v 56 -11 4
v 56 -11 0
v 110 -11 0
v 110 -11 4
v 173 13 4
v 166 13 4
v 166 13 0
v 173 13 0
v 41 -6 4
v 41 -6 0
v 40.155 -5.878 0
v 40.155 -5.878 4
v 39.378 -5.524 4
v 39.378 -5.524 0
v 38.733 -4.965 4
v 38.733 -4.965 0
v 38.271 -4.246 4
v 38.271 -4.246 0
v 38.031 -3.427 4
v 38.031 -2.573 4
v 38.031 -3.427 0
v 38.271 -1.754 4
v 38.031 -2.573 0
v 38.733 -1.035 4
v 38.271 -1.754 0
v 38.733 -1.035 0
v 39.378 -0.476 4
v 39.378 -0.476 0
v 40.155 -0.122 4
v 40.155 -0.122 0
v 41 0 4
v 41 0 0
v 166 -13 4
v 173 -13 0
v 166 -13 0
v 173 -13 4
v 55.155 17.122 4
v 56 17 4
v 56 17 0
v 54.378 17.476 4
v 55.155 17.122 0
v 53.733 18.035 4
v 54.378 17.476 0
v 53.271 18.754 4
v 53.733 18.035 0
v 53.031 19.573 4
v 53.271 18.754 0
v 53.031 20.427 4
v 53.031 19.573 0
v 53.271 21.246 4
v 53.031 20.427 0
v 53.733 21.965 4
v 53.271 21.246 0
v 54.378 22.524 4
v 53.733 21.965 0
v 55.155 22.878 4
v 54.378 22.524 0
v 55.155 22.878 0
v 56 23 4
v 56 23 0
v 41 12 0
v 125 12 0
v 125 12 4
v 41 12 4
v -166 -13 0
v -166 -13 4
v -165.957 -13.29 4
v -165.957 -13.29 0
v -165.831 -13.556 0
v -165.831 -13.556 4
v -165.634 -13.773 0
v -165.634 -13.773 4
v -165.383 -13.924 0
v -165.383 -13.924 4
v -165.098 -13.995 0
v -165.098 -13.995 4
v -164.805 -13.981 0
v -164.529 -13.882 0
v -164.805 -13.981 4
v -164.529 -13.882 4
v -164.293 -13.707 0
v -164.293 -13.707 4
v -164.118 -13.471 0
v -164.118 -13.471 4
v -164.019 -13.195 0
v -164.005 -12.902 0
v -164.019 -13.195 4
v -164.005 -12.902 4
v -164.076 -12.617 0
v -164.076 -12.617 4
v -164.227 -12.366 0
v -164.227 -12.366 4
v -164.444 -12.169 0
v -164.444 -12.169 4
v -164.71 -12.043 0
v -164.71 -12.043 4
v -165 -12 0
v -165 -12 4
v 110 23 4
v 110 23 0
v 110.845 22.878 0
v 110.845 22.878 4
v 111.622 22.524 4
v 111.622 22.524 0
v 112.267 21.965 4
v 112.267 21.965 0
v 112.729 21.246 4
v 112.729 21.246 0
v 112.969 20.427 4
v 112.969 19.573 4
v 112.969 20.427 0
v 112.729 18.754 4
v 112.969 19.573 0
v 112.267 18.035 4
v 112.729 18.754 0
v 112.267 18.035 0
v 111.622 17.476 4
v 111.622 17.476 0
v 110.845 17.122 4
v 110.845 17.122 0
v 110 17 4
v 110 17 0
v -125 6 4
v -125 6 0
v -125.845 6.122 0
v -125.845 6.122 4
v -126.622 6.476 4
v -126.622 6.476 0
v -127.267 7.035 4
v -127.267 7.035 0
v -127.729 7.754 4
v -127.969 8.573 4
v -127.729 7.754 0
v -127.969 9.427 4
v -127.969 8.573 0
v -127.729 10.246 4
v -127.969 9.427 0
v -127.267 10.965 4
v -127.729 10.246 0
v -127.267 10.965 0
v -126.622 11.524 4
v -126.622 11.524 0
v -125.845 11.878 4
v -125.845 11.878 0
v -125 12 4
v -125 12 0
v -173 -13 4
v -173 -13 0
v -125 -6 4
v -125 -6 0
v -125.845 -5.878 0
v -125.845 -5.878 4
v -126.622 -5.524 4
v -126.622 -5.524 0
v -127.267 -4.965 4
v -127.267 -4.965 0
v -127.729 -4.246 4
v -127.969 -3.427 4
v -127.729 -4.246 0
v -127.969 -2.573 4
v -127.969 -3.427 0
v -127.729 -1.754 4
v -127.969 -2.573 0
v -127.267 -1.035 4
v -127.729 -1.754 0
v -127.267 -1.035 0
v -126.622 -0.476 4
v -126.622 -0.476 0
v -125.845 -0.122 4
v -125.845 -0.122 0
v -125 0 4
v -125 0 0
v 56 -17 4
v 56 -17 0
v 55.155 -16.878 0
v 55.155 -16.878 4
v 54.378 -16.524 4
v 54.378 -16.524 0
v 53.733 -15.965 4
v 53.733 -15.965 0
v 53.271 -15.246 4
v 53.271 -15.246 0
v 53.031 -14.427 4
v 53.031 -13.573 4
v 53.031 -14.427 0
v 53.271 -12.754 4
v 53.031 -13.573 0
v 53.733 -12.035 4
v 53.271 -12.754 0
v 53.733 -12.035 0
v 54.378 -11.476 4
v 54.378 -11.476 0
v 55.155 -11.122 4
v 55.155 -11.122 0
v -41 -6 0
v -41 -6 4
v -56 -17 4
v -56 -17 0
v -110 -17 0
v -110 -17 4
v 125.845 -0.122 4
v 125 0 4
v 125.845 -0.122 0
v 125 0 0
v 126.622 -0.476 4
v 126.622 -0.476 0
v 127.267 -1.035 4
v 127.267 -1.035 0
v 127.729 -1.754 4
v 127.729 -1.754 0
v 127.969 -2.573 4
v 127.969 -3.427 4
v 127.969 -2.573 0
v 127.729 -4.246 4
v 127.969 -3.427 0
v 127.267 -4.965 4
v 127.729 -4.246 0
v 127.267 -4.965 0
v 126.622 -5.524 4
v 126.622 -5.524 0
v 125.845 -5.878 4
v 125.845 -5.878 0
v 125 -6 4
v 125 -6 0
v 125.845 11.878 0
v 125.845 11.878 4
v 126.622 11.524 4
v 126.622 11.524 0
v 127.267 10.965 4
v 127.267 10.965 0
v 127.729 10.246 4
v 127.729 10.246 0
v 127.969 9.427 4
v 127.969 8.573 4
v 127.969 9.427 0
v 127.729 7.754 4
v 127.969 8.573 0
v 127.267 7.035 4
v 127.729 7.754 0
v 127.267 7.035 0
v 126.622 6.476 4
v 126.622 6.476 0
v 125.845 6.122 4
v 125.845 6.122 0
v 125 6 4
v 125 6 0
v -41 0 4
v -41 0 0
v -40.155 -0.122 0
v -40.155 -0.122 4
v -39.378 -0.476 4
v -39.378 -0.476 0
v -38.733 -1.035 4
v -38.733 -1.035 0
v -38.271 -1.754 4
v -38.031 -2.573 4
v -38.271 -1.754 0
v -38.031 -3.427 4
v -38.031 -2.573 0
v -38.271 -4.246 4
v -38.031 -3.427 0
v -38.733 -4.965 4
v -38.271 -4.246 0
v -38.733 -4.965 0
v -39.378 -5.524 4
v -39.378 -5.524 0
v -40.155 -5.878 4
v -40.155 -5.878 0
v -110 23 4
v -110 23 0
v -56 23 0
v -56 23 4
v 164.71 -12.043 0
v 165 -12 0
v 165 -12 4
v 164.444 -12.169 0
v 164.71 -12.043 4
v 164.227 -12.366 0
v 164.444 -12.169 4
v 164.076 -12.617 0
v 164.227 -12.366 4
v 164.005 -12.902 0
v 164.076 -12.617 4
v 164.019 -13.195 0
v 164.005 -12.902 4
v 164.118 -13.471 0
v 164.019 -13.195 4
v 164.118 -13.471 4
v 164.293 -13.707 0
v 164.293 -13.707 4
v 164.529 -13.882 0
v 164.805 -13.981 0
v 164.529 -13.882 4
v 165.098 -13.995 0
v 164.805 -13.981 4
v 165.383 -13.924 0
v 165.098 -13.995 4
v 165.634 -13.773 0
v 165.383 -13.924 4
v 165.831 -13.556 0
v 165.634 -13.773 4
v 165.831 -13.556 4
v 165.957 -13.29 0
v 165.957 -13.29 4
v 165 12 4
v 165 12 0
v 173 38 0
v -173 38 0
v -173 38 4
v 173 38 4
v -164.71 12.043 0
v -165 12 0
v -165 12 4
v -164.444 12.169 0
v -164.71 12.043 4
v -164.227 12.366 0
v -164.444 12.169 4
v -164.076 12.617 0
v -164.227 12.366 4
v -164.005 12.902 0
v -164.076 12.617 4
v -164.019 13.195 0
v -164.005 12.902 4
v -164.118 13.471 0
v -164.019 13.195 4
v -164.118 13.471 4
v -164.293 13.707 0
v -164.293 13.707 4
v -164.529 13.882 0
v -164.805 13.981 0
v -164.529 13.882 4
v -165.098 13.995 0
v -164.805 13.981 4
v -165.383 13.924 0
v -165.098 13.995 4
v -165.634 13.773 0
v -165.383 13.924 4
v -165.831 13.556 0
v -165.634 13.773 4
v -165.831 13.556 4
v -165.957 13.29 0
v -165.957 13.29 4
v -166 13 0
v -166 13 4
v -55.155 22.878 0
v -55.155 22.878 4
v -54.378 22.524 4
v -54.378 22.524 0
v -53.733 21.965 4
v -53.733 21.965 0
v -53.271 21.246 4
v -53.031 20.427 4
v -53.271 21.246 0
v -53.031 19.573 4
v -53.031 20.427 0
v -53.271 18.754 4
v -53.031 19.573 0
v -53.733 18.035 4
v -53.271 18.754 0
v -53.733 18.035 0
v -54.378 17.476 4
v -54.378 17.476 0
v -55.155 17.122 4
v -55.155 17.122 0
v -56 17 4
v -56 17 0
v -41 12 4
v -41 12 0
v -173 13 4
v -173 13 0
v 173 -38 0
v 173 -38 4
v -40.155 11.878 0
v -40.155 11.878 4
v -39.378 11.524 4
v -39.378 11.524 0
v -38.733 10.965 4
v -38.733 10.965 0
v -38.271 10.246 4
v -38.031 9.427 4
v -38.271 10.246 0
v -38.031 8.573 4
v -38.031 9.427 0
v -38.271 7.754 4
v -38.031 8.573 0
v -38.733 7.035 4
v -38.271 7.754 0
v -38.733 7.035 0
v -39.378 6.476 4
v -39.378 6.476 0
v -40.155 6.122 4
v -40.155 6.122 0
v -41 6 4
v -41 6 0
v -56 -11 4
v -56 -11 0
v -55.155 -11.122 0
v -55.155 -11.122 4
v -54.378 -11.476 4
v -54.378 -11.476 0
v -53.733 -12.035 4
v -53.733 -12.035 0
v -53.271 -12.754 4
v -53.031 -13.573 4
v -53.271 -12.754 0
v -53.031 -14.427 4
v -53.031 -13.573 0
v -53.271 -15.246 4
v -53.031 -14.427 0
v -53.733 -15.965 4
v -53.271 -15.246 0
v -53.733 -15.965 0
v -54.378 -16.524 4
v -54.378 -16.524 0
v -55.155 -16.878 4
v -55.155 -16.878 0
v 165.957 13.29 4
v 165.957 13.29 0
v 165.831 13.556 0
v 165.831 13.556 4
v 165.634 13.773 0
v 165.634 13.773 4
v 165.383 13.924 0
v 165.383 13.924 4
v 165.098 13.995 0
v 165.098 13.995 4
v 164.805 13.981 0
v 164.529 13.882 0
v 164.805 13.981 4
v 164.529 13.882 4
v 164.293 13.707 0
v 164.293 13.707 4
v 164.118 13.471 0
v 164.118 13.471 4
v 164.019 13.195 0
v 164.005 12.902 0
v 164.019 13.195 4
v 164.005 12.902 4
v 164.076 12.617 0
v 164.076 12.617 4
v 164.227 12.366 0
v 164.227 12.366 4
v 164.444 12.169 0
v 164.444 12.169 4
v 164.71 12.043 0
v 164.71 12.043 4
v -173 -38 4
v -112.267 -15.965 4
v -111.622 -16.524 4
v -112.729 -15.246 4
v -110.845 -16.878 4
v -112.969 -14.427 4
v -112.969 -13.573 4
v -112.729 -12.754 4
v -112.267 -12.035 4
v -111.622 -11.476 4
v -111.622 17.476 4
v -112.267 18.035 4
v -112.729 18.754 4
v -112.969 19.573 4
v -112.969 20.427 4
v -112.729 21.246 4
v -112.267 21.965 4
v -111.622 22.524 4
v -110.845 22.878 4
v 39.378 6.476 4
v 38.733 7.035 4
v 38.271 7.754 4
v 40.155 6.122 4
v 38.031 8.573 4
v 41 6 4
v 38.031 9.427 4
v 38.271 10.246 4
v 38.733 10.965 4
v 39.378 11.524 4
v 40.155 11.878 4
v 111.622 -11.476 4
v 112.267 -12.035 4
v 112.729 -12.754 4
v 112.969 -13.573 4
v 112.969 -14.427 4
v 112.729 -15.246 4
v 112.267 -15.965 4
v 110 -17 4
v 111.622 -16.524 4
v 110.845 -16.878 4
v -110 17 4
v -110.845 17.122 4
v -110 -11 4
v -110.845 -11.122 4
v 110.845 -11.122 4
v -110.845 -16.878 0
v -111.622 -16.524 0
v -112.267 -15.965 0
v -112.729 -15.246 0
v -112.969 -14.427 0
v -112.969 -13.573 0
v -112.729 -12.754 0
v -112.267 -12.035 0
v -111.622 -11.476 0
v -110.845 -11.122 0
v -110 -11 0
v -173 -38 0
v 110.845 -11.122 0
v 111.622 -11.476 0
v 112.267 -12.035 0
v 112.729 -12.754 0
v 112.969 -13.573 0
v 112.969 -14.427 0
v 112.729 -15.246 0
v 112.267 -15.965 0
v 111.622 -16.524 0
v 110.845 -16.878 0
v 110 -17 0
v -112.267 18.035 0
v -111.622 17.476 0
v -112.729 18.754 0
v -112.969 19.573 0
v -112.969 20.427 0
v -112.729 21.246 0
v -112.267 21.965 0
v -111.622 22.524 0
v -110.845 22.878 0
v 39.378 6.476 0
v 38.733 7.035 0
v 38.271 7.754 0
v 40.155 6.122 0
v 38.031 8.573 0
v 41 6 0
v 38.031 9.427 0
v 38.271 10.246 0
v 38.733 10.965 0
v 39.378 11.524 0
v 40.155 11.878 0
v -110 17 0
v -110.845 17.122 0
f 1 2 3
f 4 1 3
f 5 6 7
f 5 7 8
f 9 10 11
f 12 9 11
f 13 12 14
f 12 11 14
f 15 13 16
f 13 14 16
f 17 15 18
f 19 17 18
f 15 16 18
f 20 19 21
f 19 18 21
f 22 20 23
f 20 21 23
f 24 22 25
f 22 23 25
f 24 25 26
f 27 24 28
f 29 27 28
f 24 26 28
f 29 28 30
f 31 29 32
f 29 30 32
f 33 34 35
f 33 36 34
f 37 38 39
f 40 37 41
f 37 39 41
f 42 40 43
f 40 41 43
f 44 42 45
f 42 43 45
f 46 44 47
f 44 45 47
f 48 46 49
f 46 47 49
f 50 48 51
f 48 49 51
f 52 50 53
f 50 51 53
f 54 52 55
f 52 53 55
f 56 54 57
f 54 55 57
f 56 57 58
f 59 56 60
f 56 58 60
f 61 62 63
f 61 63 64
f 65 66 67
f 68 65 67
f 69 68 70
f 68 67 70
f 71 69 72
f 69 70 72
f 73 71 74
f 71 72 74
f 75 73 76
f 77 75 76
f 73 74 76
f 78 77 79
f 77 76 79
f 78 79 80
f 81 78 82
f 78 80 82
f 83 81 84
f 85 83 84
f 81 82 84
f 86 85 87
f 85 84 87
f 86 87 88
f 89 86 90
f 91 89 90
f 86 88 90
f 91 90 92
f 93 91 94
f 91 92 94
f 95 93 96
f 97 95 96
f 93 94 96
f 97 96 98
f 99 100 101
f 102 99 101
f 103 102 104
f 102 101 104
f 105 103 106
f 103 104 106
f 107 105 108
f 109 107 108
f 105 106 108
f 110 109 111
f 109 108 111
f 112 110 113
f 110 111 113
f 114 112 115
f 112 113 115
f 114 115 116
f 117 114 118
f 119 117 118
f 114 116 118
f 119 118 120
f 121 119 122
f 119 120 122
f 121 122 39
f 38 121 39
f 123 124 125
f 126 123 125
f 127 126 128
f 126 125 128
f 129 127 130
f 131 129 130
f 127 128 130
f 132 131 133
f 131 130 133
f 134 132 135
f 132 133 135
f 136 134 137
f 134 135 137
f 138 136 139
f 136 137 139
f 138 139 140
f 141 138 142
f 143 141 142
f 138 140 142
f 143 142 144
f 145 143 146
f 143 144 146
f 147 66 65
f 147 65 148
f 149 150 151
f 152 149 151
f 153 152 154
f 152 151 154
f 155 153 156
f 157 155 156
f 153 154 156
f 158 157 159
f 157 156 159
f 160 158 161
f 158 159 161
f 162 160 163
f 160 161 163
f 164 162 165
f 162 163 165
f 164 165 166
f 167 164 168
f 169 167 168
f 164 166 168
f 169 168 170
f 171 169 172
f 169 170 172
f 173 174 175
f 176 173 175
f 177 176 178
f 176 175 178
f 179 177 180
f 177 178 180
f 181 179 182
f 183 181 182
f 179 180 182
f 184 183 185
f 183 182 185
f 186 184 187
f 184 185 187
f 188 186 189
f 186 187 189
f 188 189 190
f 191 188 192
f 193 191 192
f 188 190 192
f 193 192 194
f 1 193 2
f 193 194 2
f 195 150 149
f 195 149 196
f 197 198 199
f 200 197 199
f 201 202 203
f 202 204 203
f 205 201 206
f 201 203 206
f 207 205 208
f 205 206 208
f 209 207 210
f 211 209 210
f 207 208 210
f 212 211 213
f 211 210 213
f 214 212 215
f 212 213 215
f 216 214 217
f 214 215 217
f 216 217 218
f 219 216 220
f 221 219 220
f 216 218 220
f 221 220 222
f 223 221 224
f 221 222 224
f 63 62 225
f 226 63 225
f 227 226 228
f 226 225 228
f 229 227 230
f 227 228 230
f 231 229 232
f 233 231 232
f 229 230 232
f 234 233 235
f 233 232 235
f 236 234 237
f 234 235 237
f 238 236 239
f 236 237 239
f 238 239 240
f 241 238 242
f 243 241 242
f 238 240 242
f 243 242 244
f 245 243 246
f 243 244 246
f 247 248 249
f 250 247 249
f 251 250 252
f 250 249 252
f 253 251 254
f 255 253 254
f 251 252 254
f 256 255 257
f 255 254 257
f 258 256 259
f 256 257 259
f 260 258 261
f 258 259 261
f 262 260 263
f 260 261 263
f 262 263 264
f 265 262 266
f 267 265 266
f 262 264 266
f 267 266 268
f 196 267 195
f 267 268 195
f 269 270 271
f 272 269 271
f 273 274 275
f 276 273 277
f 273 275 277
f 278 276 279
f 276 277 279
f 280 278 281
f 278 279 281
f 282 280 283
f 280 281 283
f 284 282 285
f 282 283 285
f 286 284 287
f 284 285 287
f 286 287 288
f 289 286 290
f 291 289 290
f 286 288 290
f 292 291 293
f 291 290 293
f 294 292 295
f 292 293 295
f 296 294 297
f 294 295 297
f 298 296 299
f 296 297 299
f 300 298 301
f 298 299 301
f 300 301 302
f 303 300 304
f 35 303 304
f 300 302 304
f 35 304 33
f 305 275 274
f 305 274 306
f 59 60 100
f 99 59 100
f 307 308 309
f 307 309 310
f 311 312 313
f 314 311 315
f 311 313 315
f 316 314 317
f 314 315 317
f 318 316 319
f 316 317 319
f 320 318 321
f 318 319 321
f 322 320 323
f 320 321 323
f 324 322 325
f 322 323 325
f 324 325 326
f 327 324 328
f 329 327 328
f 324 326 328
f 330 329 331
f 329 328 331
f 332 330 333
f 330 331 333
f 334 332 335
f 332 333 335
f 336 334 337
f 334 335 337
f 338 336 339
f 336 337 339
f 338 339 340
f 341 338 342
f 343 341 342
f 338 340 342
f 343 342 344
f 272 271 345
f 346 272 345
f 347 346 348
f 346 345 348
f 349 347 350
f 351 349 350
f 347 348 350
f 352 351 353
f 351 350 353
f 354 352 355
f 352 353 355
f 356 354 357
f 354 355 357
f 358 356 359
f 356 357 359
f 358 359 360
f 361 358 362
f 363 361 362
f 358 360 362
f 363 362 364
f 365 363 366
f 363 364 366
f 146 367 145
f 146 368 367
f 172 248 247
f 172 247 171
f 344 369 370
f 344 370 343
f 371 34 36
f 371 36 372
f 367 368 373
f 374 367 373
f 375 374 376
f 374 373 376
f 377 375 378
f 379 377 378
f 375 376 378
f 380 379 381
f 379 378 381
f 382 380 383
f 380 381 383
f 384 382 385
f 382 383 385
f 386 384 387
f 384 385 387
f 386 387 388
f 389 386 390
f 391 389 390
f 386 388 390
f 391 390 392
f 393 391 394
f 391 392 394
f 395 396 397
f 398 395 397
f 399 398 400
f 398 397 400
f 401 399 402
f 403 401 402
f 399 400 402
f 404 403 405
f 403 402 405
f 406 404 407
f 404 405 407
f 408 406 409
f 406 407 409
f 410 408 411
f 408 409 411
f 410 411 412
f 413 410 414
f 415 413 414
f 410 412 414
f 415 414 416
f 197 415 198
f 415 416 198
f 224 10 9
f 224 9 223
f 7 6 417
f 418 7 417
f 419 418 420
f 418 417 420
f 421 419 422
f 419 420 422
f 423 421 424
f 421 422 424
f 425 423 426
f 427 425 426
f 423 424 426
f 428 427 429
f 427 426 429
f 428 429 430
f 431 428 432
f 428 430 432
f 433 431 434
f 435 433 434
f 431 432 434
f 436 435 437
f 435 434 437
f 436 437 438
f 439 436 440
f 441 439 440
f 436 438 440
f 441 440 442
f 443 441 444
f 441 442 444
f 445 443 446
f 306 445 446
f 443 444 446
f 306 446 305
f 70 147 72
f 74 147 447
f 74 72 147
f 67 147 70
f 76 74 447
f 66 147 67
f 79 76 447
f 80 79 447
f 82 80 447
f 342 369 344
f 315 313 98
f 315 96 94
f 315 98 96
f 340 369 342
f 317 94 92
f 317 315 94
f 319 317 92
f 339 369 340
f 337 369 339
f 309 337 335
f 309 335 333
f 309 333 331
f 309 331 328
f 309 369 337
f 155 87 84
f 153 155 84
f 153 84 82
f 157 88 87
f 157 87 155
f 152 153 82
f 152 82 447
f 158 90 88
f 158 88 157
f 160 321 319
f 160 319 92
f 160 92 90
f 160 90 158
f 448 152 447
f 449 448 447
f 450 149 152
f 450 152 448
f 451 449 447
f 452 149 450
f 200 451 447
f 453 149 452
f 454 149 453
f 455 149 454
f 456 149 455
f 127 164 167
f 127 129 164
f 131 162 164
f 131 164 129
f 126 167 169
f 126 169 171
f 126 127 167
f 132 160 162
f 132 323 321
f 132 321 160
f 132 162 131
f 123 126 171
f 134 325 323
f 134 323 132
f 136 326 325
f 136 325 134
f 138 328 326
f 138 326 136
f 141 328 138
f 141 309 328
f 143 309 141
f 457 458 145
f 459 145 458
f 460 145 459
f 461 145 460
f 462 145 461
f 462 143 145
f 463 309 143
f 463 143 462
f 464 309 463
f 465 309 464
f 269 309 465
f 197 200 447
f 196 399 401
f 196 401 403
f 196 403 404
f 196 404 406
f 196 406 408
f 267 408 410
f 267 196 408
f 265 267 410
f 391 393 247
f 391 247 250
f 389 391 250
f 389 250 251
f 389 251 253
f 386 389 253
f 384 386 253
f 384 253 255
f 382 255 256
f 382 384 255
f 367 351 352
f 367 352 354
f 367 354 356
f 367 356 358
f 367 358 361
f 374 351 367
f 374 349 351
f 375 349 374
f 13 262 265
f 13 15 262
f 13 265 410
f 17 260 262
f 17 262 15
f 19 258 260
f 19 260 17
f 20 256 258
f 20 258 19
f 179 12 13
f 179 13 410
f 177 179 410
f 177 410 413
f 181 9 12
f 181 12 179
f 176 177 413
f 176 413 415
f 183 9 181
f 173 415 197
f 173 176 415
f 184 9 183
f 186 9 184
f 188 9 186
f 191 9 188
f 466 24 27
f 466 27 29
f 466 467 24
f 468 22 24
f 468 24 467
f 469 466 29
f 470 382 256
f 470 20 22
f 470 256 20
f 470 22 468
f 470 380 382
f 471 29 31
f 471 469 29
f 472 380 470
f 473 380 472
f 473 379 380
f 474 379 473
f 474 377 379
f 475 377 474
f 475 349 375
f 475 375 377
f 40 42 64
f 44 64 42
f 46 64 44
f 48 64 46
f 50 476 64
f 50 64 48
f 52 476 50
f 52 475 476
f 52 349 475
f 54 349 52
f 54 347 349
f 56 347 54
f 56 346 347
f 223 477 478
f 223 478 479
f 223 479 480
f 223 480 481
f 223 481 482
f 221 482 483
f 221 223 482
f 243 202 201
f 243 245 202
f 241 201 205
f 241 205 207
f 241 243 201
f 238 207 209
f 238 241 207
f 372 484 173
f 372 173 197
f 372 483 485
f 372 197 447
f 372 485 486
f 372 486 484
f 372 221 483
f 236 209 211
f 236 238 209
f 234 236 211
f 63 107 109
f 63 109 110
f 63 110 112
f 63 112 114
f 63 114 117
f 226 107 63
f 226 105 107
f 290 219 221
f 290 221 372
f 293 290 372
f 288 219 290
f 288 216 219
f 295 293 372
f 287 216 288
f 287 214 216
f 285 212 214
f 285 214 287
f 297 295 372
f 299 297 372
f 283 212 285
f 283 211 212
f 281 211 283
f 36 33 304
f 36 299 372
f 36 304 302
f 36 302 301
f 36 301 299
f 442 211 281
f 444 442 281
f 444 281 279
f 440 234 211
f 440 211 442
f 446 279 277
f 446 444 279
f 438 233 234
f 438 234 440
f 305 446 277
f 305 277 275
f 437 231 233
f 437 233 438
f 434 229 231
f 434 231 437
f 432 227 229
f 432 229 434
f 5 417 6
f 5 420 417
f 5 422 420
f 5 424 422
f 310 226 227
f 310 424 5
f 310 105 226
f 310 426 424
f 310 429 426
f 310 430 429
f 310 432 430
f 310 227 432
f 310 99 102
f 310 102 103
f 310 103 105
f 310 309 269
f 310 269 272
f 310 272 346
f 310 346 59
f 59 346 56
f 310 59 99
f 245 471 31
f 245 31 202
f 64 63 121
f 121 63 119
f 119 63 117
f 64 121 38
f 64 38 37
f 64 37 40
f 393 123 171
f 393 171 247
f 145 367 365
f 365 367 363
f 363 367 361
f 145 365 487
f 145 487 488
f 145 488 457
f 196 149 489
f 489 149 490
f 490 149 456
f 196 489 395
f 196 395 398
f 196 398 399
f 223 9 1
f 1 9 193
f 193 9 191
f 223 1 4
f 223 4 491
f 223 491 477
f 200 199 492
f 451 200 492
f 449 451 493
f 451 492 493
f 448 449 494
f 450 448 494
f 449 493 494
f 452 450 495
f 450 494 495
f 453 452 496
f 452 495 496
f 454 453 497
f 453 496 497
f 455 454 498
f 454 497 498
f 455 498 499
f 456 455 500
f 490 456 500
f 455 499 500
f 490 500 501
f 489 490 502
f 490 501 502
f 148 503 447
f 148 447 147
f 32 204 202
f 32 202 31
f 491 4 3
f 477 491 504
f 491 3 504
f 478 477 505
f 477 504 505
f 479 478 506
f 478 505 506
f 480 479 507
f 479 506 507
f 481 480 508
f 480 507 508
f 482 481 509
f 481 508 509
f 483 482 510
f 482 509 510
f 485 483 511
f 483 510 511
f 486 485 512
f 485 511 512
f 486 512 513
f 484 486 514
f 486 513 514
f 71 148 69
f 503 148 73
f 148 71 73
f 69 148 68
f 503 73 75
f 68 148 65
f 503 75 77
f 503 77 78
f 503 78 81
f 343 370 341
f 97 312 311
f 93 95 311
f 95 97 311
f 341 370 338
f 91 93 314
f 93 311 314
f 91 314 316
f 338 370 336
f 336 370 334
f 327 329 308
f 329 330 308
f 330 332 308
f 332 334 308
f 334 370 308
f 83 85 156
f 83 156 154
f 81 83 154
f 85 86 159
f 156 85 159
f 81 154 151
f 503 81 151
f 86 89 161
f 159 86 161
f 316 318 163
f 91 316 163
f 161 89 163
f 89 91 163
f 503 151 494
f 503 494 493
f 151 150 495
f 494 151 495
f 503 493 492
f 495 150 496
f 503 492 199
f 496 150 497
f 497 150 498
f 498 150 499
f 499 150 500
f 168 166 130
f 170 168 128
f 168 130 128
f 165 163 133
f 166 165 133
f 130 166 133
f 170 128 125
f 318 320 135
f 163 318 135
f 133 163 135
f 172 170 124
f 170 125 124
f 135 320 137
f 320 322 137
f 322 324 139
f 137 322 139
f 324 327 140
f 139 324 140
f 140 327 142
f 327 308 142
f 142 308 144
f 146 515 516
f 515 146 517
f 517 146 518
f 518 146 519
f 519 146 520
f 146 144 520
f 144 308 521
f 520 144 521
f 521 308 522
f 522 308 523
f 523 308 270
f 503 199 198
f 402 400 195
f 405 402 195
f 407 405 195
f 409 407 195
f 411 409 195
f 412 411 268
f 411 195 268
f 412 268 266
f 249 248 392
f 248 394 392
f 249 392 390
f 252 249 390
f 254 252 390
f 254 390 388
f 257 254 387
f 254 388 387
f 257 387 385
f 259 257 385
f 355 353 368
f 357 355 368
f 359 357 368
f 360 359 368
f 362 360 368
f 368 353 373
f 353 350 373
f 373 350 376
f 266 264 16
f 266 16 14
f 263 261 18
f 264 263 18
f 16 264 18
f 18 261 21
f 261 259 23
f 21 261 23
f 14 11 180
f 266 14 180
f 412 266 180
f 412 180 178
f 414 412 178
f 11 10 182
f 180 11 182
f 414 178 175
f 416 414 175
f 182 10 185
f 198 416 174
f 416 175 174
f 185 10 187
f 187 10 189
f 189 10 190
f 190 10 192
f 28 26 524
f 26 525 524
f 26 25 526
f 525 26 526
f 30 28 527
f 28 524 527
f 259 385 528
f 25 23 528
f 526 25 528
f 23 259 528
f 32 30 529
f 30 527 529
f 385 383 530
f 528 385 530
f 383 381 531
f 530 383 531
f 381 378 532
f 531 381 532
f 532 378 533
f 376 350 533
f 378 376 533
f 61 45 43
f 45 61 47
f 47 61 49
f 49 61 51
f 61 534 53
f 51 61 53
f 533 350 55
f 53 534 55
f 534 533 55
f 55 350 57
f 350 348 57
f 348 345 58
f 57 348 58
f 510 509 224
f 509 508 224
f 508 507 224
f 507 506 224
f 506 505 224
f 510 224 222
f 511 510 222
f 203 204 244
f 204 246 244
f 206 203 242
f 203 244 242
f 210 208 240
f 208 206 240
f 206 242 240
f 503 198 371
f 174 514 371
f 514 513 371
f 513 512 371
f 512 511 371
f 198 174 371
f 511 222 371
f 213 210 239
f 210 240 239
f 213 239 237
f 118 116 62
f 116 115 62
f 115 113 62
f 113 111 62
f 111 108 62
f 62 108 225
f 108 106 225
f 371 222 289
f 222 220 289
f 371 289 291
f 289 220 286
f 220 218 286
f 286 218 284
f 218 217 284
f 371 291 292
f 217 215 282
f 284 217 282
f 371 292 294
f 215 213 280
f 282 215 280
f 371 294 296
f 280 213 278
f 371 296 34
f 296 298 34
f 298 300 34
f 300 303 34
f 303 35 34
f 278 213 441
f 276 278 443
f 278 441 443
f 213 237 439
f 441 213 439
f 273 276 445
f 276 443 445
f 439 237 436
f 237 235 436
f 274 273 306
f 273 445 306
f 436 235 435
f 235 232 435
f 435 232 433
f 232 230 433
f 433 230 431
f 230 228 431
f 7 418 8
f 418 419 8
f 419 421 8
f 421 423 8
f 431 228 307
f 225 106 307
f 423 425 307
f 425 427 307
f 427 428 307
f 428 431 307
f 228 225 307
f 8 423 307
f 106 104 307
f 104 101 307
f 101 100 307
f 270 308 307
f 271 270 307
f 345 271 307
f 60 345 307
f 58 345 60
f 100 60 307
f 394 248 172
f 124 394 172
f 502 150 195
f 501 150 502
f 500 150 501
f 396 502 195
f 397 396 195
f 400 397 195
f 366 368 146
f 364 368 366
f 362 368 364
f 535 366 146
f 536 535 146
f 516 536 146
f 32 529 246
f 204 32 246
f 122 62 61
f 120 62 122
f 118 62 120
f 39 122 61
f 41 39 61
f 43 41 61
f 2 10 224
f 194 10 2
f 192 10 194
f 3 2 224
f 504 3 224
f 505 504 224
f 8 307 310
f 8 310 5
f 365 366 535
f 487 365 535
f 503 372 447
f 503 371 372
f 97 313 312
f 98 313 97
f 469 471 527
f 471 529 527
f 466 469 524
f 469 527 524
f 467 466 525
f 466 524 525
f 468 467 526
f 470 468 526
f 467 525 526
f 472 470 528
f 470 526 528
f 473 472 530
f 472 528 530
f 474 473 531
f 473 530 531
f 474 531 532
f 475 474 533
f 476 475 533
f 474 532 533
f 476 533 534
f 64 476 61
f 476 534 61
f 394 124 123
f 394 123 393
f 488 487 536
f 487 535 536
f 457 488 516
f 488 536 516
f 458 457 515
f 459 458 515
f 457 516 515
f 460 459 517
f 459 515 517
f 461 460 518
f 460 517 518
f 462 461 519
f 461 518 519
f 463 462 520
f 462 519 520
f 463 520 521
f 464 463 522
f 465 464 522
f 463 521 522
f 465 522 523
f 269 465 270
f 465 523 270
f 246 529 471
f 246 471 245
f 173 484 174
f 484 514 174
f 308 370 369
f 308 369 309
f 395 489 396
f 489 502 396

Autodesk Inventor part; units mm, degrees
ref_plane "YZ Plane" through (0, 0, 0) normal (1, 0, 0) x (0, 1, 0)
ref_plane "XZ Plane" through (0, 0, 0) normal (0, 1, 0) x (-1, 0, 0)
ref_plane "XY Plane" through (0, 0, 0) normal (0, 0, 1) x (1, 0, 0)
sketch "Esboço1" plane through (0, 0, 0) normal (0, 0, 1) x (1, 0, 0)
  line L0 (-173, 38) -> (173, 38)
  line L1 (173, 38) -> (173, -38)
  line L2 (173, -38) -> (-173, -38)
  line L3 (-173, -38) -> (-173, 38)
  point P0 (0, 0)
  point P1 (173, 0)
  point P2 (0, 38)
  dimension "d0" = 346
  dimension "d1" = 76
extrude "Extrusão1" add sketch "Esboço1" along normal blind 4
sketch "Esboço2" plane through (0, 0, 4) normal (0, 0, 1) x (1, 0, 0)
  line L0 (-173, 38) -> (-173, -38) projected
  line L1 (-173, 13) -> (-165, 13)
  line L2 (-165, 13) -> (-165, -13)
  line L3 (-165, -13) -> (-173, -13)
  line L4 (-173, -13) -> (-173, 13)
  line L5 (173, 38) -> (-173, 38) projected
  circle A0 centre (-165, 13) radius 1
  circle A1 centre (-165, -13) radius 1
  point P0 (0, 0)
  dimension "d4" = 8
  dimension "d5" = 26
  dimension "d6" = 25
  dimension "d7" = 2
  dimension "d8" = 2
extrude "Extrusão2" cut sketch "Esboço2" against normal blind 10
mirror "Espelhamento1" about plane through (0, 0, 0) normal (1, 0, 0) of "Extrusão2"
sketch "Esboço3" plane through (0, 0, 0) normal (0, 0, -1) x (-1, 0, 0)
  line L0 (-113, -17) -> (-38, -17)
  line L1 (173, 38) -> (-173, 38) projected
  line L2 (-165, 12) -> (-165, -12) projected
  line L3 (-56, 23) -> (-110, 23)
  line L4 (-113, 20) -> (-113, 20)
  line L5 (-110, 17) -> (-56, 17)
  line L6 (-53, 20) -> (-53, 20)
  line L7 (-125, 12) -> (-41, 12)
  line L8 (-38, 9) -> (-38, 9)
  line L9 (-41, 6) -> (-125, 6)
  line L10 (-128, 9) -> (-128, 9)
  line L11 (-125, 0) -> (-41, 0)
  line L12 (-38, -3) -> (-38, -3)
  line L13 (-41, -6) -> (-125, -6)
  line L14 (-128, -3) -> (-128, -3)
  line L15 (-110, -17) -> (-56, -17)
  line L16 (-53, -14) -> (-53, -14)
  line L17 (-56, -11) -> (-110, -11)
  line L18 (-113, -14) -> (-113, -14)
  arc A0 (-113, -14) -> (-110, -17) centre (-110, -14) ccw
  arc A1 (-110, -11) -> (-113, -14) centre (-110, -14) ccw
  arc A2 (-56, -17) -> (-53, -14) centre (-56, -14) ccw
  arc A3 (-53, -14) -> (-56, -11) centre (-56, -14) ccw
  arc A4 (-38, -3) -> (-41, 0) centre (-41, -3) ccw
  arc A5 (-41, -6) -> (-38, -3) centre (-41, -3) ccw
  arc A6 (-41, 6) -> (-38, 9) centre (-41, 9) ccw
  arc A7 (-38, 9) -> (-41, 12) centre (-41, 9) ccw
  arc A8 (-56, 17) -> (-53, 20) centre (-56, 20) ccw
  arc A9 (-113, 20) -> (-110, 17) centre (-110, 20) ccw
  arc A10 (-110, 23) -> (-113, 20) centre (-110, 20) ccw
  arc A11 (-53, 20) -> (-56, 23) centre (-56, 20) ccw
  arc A12 (-128, -3) -> (-125, -6) centre (-125, -3) ccw
  arc A13 (-125, 0) -> (-128, -3) centre (-125, -3) ccw
  arc A14 (-128, 9) -> (-125, 6) centre (-125, 9) ccw
  arc A15 (-125, 12) -> (-128, 9) centre (-125, 9) ccw
  point P0 (0, 0)
  point P1 (-53, 23)
  point P2 (-38, 6)
  point P3 (-38, 12)
  point P4 (-38, -6)
  point P5 (-38, 0)
  point P6 (-53, -11)
  point P7 (-53, -17)
  dimension "d16" = 6
  dimension "d17" = 5
  dimension "d18" = 6
  dimension "d19" = 6
  dimension "d20" = 6
  dimension "d22" = 90
  dimension "d23" = 90
  dimension "d24" = 60
  dimension "d25" = 15
  dimension "d26" = 37
  dimension "d27" = 37
  dimension "d28" = 60
  dimension "d29" = 15
  dimension "d30" = 3
  dimension "d31" = 3
  dimension "d32" = 3
  dimension "d35" = 15
  dimension "d36" = 6
  dimension "d37" = 6
  dimension "d38" = 6
  dimension "d39" = 5
extrude "Extrusão3" cut sketch "Esboço3" against normal blind 10
mirror "Espelhamento2" about plane through (0, 0, 0) normal (1, 0, 0) of "Extrusão3"
properties part number "placa auto falante"
